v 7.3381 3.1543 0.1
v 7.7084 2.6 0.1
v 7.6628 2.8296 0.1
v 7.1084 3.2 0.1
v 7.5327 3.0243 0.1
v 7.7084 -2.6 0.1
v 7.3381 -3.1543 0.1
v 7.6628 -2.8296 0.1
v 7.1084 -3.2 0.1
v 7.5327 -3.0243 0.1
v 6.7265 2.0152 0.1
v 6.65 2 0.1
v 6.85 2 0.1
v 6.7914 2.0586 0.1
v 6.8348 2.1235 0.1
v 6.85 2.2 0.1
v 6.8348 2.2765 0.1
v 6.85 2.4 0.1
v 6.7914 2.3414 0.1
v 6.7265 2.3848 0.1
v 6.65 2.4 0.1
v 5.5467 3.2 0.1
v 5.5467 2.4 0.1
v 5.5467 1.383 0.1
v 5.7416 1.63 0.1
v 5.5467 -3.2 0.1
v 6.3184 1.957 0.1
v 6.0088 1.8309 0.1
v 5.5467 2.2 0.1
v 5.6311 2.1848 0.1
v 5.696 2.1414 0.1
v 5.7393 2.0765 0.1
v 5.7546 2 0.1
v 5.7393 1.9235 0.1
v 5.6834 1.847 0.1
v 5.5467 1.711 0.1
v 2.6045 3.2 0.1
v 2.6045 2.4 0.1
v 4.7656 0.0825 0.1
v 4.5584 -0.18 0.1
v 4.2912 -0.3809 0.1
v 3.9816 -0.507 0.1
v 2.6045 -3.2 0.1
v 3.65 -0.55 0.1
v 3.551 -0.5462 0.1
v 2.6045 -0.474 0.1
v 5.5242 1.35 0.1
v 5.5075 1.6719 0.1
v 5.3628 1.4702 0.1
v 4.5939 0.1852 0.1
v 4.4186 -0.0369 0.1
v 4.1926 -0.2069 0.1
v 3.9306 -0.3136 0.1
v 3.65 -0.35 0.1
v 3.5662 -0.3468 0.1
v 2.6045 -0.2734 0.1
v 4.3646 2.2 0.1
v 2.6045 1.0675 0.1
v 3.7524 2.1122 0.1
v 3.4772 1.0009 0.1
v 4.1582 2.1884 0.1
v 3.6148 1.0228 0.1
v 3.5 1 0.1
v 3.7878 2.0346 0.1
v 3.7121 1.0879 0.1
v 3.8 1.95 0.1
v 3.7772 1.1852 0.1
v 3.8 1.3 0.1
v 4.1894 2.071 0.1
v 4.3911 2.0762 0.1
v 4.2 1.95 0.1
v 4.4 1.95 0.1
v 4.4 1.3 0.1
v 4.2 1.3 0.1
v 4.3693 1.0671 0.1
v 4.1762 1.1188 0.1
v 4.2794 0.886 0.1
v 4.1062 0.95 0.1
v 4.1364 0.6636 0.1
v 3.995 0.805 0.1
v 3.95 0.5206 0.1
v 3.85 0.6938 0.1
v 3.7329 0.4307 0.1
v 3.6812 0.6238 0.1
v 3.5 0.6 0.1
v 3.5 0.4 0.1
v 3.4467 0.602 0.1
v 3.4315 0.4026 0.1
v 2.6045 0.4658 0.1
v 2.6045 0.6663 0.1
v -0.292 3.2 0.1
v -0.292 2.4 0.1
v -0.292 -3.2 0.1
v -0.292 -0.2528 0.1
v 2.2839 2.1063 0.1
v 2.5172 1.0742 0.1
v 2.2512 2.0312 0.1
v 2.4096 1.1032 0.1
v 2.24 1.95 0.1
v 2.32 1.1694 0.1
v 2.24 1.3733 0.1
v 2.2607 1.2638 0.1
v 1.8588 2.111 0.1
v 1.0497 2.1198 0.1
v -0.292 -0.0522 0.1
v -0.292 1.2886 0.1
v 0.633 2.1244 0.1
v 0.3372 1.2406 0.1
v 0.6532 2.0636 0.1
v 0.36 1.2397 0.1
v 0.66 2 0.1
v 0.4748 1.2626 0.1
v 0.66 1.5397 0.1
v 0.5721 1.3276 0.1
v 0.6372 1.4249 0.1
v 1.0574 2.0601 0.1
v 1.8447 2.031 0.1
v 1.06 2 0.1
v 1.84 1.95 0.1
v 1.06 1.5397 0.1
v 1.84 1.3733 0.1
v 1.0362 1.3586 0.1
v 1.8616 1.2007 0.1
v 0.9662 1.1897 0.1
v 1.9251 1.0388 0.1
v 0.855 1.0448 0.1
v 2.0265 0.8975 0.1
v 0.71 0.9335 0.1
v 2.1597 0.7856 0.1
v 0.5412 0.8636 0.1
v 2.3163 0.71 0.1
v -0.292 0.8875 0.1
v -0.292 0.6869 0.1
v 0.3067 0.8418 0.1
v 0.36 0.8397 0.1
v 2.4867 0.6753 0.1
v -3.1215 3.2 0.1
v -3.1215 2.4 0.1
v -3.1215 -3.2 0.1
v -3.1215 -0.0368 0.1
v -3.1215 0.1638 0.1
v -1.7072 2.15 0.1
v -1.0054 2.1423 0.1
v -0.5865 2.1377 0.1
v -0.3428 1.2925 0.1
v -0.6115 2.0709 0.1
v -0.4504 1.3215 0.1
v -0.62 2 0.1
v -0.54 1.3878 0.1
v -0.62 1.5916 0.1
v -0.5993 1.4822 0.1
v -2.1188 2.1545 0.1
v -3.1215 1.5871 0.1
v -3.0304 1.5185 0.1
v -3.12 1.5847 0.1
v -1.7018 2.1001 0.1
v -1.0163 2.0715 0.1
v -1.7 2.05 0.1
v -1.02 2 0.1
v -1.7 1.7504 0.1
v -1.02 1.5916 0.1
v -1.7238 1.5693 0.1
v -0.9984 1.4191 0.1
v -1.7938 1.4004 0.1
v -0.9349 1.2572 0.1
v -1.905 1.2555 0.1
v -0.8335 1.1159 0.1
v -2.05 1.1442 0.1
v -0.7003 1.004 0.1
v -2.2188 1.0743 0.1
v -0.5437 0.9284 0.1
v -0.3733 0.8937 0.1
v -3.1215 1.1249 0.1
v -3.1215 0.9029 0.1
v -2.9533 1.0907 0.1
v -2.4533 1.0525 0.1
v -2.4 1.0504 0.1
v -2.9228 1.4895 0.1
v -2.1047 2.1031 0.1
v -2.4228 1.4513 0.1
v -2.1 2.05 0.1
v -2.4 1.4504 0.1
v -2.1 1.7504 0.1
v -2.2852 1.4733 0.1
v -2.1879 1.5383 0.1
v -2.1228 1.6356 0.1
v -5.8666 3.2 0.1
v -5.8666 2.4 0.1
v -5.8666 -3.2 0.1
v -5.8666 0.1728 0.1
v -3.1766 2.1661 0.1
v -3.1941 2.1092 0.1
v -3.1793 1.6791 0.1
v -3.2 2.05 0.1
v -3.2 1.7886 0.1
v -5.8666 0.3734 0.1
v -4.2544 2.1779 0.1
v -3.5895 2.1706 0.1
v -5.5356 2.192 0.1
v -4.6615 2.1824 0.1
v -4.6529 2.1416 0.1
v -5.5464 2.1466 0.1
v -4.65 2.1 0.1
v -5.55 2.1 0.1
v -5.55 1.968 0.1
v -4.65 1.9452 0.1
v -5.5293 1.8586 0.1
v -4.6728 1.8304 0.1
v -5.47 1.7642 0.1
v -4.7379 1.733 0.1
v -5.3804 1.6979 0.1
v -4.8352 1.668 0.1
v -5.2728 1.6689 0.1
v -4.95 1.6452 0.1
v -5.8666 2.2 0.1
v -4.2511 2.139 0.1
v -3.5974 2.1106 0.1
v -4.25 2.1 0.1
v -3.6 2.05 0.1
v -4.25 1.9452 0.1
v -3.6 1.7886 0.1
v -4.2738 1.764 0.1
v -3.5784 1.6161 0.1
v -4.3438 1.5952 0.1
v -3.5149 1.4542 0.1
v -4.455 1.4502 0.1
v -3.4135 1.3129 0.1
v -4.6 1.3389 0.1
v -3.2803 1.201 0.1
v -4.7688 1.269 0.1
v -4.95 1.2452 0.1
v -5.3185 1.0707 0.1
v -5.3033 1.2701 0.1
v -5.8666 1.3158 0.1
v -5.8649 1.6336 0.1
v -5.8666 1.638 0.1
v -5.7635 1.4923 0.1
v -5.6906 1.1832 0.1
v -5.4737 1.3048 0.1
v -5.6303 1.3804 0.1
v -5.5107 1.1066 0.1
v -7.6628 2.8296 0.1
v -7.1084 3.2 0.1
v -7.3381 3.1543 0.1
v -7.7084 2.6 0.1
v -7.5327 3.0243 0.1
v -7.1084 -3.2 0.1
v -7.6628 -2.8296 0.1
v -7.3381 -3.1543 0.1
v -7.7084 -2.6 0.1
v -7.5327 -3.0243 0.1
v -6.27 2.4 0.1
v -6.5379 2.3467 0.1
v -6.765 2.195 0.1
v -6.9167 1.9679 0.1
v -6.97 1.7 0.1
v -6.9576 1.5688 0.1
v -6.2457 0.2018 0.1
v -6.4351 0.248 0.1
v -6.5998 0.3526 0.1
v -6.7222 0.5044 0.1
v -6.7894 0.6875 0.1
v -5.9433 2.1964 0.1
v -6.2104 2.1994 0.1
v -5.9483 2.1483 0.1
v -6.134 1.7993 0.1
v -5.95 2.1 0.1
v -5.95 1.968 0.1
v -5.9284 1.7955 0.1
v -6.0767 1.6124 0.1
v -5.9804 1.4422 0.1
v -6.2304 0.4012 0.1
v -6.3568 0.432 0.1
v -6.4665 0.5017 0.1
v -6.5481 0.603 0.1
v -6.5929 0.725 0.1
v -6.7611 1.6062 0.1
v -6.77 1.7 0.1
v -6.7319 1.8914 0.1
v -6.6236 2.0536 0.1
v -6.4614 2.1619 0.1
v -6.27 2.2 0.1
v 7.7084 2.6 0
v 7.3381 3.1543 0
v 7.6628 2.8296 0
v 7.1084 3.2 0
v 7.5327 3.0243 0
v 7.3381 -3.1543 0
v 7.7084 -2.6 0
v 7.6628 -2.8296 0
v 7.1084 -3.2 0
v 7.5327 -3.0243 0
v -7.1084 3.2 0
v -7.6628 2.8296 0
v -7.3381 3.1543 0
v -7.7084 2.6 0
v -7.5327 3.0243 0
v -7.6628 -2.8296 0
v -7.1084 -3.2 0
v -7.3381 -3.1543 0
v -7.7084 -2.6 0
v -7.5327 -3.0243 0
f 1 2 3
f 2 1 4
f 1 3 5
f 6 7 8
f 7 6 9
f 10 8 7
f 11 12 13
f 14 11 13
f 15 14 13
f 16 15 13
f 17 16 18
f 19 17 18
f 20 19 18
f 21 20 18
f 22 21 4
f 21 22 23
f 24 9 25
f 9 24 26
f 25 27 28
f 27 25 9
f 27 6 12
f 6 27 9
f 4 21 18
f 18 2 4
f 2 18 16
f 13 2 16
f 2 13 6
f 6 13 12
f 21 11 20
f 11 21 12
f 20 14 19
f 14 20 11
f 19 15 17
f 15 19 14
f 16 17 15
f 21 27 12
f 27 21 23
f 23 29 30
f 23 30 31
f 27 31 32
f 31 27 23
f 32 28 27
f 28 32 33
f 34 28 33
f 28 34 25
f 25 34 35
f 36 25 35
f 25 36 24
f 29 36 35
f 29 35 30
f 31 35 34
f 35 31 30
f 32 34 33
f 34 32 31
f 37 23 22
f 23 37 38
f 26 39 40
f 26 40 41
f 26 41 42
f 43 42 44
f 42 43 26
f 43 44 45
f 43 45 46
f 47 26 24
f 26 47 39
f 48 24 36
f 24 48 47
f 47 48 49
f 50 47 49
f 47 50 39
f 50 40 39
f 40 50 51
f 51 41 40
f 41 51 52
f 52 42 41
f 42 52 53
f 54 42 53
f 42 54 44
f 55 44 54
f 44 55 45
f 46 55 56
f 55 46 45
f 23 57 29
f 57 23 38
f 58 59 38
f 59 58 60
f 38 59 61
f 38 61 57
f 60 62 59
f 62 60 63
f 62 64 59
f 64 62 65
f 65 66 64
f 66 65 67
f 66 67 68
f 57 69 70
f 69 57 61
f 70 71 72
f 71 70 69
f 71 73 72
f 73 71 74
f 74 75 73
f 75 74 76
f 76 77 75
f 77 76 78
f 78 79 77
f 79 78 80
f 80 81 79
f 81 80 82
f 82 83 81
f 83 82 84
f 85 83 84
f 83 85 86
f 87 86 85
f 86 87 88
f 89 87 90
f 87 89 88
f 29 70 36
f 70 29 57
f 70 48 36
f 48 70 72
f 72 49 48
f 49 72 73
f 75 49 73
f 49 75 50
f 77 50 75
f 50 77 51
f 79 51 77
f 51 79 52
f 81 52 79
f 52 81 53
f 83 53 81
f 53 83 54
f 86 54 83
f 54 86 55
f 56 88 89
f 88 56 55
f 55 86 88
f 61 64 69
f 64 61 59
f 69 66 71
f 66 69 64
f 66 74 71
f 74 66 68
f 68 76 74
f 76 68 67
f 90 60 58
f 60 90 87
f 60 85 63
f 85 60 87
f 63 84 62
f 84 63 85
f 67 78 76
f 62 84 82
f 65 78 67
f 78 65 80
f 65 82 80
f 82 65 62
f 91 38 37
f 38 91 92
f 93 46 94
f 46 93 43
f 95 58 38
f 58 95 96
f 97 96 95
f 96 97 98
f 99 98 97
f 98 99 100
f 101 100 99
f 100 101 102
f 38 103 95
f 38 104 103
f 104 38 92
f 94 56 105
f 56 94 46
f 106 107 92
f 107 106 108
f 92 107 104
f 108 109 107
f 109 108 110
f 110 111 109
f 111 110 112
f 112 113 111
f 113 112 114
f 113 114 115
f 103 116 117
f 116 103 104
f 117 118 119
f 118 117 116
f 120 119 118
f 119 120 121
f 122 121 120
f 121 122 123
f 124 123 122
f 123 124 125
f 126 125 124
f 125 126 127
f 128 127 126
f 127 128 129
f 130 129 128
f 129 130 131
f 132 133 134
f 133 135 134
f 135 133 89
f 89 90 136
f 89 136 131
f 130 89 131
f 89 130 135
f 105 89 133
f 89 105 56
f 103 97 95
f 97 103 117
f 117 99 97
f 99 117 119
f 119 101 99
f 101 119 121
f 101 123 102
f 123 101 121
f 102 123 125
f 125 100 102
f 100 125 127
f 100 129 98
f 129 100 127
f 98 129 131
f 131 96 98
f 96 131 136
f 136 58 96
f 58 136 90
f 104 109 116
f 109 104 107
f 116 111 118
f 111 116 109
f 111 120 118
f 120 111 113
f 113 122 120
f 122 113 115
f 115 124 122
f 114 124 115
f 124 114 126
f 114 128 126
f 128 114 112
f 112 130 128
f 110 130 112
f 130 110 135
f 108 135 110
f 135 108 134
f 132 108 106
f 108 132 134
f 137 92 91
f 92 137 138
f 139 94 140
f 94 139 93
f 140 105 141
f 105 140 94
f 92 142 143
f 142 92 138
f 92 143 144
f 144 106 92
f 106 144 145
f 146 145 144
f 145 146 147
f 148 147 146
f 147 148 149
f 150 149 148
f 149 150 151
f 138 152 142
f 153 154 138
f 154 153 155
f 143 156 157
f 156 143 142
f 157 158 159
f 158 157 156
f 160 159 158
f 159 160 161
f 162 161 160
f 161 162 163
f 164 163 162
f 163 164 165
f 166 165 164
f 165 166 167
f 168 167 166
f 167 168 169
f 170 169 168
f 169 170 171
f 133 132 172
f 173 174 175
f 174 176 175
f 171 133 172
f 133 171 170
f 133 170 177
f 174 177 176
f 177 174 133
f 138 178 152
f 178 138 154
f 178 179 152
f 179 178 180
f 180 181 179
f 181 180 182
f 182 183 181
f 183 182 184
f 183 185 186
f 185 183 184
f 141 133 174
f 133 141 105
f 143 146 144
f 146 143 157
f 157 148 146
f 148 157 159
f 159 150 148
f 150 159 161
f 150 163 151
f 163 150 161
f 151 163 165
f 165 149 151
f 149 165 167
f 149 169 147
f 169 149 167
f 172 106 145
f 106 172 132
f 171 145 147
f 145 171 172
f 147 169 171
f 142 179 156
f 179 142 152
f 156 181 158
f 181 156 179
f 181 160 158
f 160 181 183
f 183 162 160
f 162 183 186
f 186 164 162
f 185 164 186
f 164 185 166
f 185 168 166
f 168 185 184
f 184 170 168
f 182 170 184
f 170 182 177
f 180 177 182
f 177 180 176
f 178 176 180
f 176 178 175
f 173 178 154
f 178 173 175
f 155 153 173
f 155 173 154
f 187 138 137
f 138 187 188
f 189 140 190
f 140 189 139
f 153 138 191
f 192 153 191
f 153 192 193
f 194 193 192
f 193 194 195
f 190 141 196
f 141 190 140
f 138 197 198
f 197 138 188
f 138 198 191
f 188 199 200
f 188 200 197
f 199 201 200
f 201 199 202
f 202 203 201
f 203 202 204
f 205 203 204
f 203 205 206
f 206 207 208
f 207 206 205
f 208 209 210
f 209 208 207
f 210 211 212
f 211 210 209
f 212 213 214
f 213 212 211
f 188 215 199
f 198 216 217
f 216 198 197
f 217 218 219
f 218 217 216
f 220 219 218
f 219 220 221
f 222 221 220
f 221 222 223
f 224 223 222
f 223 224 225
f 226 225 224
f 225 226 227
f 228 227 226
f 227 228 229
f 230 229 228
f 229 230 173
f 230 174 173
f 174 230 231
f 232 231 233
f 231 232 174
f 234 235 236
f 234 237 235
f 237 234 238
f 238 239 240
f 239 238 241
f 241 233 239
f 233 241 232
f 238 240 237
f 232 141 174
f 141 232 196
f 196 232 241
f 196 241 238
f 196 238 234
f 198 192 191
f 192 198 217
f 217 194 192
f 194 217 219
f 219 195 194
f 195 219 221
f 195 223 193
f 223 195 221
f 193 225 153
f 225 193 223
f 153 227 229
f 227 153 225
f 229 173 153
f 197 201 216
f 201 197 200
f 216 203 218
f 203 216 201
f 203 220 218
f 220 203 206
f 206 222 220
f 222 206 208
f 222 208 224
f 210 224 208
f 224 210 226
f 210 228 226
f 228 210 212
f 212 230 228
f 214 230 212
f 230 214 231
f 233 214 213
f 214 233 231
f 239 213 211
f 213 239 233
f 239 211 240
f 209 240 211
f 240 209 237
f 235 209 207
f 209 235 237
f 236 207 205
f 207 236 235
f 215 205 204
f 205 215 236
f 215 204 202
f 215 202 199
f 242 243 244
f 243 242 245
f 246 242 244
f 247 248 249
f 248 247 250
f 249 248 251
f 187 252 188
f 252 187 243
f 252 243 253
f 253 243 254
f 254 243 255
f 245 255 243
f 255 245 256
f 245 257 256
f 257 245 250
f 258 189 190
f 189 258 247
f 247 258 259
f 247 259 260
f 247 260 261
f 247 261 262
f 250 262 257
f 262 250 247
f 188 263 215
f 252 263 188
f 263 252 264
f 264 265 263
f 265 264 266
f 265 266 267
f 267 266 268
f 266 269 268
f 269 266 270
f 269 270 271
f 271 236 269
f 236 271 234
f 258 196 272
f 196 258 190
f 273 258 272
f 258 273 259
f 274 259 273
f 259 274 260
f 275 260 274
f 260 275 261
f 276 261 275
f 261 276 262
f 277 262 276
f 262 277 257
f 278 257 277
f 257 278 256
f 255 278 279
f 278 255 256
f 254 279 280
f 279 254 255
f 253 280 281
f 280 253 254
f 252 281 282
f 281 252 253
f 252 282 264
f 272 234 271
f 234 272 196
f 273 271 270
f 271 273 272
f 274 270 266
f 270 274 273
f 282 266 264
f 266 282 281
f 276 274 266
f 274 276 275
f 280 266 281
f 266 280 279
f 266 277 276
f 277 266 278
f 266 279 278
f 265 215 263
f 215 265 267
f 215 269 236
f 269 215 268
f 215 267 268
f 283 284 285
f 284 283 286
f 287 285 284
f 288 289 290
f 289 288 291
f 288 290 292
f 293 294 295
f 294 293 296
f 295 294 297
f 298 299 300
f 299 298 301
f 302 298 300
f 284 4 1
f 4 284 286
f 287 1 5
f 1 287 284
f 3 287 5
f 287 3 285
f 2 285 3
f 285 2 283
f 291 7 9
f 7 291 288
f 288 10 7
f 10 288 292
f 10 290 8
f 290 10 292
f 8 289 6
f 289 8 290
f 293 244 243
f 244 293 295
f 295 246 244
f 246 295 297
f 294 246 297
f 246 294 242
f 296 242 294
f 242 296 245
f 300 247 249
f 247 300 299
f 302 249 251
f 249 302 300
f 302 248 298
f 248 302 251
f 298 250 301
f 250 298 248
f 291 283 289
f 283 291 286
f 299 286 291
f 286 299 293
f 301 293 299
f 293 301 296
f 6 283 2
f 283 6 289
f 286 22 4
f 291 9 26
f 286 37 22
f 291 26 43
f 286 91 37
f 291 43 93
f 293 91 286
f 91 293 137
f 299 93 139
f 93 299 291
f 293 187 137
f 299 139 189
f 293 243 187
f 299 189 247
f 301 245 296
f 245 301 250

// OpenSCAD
use <../lib.scad>
use <s/6177949fs01.scad>
use <s/6177949fs02.scad>
use <s/6177949fs03.scad>
use <s/6177949fs04.scad>
use <s/6177949fs05.scad>
use <s/6177949fs06.scad>
use <s/6177949fs07.scad>
function ldraw_lib__6177949f() = [
// 0 Sticker  0.8 x  1.9 with Black and Dark Blue Headlamp on Transparent Background Right
// 0 Name: 6177949f.dat
// 0 Author: Massimo Maso [Sirio]
// 0 !LDRAW_ORG Part UPDATE 2022-04
// 0 !LICENSE Licensed under CC BY 4.0 : see CAreadme.txt
// 
// 0 BFC CERTIFY CCW
  [0,"BFC","CERTIFY"],
  [0,"BFC","CCW"],
// 
// 0 !KEYWORDS Bugatti, Chiron, Set 75878, Speed Champions
// 
// 0 !HISTORY 2022-07-18 [PTadmin] Official Update 2022-04
// 
// 
// 1 16 13.8789 0 0 0 0 1 0 1 0 -1 0 0 s\6177949fs01.dat
  [1,16,13.8789,0,0,0,0,1,0,1,0,-1,0,0, ldraw_lib__s__6177949fs01()],
// 1 16 13.8547 0 0 0 0 1 0 1 0 -1 0 0 s\6177949fs02.dat
  [1,16,13.8547,0,0,0,0,1,0,1,0,-1,0,0, ldraw_lib__s__6177949fs02()],
// 1 16 -.7172 0 0 0 0 1 0 1 0 -1 0 0 s\6177949fs03.dat
  [1,16,-.7172,0,0,0,0,1,0,1,0,-1,0,0, ldraw_lib__s__6177949fs03()],
// 1 16 -.7428 0 0 0 0 1 0 1 0 -1 0 0 s\6177949fs04.dat
  [1,16,-.7428,0,0,0,0,1,0,1,0,-1,0,0, ldraw_lib__s__6177949fs04()],
// 1 16 -14.6522 0 0 0 0 1 0 1 0 -1 0 0 s\6177949fs05.dat
  [1,16,-14.6522,0,0,0,0,1,0,1,0,-1,0,0, ldraw_lib__s__6177949fs05()],
// 1 16 -14.681 0 0 0 0 1 0 1 0 -1 0 0 s\6177949fs06.dat
  [1,16,-14.681,0,0,0,0,1,0,1,0,-1,0,0, ldraw_lib__s__6177949fs06()],
// 1 16 0 0 0 0 0 1 0 1 0 -1 0 0 s\6177949fs07.dat
  [1,16,0,0,0,0,0,1,0,1,0,-1,0,0, ldraw_lib__s__6177949fs07()],
];
module ldraw_lib__6177949f(step=0, col=false, unit=2/5, alt=false, line=0.2, solid=!$preview)
    makepoly(ldraw_lib__6177949f(), step=step, col=col, unit=unit, alt=alt, line=line, solid=solid);
ldraw_lib__6177949f(line=0.2);
